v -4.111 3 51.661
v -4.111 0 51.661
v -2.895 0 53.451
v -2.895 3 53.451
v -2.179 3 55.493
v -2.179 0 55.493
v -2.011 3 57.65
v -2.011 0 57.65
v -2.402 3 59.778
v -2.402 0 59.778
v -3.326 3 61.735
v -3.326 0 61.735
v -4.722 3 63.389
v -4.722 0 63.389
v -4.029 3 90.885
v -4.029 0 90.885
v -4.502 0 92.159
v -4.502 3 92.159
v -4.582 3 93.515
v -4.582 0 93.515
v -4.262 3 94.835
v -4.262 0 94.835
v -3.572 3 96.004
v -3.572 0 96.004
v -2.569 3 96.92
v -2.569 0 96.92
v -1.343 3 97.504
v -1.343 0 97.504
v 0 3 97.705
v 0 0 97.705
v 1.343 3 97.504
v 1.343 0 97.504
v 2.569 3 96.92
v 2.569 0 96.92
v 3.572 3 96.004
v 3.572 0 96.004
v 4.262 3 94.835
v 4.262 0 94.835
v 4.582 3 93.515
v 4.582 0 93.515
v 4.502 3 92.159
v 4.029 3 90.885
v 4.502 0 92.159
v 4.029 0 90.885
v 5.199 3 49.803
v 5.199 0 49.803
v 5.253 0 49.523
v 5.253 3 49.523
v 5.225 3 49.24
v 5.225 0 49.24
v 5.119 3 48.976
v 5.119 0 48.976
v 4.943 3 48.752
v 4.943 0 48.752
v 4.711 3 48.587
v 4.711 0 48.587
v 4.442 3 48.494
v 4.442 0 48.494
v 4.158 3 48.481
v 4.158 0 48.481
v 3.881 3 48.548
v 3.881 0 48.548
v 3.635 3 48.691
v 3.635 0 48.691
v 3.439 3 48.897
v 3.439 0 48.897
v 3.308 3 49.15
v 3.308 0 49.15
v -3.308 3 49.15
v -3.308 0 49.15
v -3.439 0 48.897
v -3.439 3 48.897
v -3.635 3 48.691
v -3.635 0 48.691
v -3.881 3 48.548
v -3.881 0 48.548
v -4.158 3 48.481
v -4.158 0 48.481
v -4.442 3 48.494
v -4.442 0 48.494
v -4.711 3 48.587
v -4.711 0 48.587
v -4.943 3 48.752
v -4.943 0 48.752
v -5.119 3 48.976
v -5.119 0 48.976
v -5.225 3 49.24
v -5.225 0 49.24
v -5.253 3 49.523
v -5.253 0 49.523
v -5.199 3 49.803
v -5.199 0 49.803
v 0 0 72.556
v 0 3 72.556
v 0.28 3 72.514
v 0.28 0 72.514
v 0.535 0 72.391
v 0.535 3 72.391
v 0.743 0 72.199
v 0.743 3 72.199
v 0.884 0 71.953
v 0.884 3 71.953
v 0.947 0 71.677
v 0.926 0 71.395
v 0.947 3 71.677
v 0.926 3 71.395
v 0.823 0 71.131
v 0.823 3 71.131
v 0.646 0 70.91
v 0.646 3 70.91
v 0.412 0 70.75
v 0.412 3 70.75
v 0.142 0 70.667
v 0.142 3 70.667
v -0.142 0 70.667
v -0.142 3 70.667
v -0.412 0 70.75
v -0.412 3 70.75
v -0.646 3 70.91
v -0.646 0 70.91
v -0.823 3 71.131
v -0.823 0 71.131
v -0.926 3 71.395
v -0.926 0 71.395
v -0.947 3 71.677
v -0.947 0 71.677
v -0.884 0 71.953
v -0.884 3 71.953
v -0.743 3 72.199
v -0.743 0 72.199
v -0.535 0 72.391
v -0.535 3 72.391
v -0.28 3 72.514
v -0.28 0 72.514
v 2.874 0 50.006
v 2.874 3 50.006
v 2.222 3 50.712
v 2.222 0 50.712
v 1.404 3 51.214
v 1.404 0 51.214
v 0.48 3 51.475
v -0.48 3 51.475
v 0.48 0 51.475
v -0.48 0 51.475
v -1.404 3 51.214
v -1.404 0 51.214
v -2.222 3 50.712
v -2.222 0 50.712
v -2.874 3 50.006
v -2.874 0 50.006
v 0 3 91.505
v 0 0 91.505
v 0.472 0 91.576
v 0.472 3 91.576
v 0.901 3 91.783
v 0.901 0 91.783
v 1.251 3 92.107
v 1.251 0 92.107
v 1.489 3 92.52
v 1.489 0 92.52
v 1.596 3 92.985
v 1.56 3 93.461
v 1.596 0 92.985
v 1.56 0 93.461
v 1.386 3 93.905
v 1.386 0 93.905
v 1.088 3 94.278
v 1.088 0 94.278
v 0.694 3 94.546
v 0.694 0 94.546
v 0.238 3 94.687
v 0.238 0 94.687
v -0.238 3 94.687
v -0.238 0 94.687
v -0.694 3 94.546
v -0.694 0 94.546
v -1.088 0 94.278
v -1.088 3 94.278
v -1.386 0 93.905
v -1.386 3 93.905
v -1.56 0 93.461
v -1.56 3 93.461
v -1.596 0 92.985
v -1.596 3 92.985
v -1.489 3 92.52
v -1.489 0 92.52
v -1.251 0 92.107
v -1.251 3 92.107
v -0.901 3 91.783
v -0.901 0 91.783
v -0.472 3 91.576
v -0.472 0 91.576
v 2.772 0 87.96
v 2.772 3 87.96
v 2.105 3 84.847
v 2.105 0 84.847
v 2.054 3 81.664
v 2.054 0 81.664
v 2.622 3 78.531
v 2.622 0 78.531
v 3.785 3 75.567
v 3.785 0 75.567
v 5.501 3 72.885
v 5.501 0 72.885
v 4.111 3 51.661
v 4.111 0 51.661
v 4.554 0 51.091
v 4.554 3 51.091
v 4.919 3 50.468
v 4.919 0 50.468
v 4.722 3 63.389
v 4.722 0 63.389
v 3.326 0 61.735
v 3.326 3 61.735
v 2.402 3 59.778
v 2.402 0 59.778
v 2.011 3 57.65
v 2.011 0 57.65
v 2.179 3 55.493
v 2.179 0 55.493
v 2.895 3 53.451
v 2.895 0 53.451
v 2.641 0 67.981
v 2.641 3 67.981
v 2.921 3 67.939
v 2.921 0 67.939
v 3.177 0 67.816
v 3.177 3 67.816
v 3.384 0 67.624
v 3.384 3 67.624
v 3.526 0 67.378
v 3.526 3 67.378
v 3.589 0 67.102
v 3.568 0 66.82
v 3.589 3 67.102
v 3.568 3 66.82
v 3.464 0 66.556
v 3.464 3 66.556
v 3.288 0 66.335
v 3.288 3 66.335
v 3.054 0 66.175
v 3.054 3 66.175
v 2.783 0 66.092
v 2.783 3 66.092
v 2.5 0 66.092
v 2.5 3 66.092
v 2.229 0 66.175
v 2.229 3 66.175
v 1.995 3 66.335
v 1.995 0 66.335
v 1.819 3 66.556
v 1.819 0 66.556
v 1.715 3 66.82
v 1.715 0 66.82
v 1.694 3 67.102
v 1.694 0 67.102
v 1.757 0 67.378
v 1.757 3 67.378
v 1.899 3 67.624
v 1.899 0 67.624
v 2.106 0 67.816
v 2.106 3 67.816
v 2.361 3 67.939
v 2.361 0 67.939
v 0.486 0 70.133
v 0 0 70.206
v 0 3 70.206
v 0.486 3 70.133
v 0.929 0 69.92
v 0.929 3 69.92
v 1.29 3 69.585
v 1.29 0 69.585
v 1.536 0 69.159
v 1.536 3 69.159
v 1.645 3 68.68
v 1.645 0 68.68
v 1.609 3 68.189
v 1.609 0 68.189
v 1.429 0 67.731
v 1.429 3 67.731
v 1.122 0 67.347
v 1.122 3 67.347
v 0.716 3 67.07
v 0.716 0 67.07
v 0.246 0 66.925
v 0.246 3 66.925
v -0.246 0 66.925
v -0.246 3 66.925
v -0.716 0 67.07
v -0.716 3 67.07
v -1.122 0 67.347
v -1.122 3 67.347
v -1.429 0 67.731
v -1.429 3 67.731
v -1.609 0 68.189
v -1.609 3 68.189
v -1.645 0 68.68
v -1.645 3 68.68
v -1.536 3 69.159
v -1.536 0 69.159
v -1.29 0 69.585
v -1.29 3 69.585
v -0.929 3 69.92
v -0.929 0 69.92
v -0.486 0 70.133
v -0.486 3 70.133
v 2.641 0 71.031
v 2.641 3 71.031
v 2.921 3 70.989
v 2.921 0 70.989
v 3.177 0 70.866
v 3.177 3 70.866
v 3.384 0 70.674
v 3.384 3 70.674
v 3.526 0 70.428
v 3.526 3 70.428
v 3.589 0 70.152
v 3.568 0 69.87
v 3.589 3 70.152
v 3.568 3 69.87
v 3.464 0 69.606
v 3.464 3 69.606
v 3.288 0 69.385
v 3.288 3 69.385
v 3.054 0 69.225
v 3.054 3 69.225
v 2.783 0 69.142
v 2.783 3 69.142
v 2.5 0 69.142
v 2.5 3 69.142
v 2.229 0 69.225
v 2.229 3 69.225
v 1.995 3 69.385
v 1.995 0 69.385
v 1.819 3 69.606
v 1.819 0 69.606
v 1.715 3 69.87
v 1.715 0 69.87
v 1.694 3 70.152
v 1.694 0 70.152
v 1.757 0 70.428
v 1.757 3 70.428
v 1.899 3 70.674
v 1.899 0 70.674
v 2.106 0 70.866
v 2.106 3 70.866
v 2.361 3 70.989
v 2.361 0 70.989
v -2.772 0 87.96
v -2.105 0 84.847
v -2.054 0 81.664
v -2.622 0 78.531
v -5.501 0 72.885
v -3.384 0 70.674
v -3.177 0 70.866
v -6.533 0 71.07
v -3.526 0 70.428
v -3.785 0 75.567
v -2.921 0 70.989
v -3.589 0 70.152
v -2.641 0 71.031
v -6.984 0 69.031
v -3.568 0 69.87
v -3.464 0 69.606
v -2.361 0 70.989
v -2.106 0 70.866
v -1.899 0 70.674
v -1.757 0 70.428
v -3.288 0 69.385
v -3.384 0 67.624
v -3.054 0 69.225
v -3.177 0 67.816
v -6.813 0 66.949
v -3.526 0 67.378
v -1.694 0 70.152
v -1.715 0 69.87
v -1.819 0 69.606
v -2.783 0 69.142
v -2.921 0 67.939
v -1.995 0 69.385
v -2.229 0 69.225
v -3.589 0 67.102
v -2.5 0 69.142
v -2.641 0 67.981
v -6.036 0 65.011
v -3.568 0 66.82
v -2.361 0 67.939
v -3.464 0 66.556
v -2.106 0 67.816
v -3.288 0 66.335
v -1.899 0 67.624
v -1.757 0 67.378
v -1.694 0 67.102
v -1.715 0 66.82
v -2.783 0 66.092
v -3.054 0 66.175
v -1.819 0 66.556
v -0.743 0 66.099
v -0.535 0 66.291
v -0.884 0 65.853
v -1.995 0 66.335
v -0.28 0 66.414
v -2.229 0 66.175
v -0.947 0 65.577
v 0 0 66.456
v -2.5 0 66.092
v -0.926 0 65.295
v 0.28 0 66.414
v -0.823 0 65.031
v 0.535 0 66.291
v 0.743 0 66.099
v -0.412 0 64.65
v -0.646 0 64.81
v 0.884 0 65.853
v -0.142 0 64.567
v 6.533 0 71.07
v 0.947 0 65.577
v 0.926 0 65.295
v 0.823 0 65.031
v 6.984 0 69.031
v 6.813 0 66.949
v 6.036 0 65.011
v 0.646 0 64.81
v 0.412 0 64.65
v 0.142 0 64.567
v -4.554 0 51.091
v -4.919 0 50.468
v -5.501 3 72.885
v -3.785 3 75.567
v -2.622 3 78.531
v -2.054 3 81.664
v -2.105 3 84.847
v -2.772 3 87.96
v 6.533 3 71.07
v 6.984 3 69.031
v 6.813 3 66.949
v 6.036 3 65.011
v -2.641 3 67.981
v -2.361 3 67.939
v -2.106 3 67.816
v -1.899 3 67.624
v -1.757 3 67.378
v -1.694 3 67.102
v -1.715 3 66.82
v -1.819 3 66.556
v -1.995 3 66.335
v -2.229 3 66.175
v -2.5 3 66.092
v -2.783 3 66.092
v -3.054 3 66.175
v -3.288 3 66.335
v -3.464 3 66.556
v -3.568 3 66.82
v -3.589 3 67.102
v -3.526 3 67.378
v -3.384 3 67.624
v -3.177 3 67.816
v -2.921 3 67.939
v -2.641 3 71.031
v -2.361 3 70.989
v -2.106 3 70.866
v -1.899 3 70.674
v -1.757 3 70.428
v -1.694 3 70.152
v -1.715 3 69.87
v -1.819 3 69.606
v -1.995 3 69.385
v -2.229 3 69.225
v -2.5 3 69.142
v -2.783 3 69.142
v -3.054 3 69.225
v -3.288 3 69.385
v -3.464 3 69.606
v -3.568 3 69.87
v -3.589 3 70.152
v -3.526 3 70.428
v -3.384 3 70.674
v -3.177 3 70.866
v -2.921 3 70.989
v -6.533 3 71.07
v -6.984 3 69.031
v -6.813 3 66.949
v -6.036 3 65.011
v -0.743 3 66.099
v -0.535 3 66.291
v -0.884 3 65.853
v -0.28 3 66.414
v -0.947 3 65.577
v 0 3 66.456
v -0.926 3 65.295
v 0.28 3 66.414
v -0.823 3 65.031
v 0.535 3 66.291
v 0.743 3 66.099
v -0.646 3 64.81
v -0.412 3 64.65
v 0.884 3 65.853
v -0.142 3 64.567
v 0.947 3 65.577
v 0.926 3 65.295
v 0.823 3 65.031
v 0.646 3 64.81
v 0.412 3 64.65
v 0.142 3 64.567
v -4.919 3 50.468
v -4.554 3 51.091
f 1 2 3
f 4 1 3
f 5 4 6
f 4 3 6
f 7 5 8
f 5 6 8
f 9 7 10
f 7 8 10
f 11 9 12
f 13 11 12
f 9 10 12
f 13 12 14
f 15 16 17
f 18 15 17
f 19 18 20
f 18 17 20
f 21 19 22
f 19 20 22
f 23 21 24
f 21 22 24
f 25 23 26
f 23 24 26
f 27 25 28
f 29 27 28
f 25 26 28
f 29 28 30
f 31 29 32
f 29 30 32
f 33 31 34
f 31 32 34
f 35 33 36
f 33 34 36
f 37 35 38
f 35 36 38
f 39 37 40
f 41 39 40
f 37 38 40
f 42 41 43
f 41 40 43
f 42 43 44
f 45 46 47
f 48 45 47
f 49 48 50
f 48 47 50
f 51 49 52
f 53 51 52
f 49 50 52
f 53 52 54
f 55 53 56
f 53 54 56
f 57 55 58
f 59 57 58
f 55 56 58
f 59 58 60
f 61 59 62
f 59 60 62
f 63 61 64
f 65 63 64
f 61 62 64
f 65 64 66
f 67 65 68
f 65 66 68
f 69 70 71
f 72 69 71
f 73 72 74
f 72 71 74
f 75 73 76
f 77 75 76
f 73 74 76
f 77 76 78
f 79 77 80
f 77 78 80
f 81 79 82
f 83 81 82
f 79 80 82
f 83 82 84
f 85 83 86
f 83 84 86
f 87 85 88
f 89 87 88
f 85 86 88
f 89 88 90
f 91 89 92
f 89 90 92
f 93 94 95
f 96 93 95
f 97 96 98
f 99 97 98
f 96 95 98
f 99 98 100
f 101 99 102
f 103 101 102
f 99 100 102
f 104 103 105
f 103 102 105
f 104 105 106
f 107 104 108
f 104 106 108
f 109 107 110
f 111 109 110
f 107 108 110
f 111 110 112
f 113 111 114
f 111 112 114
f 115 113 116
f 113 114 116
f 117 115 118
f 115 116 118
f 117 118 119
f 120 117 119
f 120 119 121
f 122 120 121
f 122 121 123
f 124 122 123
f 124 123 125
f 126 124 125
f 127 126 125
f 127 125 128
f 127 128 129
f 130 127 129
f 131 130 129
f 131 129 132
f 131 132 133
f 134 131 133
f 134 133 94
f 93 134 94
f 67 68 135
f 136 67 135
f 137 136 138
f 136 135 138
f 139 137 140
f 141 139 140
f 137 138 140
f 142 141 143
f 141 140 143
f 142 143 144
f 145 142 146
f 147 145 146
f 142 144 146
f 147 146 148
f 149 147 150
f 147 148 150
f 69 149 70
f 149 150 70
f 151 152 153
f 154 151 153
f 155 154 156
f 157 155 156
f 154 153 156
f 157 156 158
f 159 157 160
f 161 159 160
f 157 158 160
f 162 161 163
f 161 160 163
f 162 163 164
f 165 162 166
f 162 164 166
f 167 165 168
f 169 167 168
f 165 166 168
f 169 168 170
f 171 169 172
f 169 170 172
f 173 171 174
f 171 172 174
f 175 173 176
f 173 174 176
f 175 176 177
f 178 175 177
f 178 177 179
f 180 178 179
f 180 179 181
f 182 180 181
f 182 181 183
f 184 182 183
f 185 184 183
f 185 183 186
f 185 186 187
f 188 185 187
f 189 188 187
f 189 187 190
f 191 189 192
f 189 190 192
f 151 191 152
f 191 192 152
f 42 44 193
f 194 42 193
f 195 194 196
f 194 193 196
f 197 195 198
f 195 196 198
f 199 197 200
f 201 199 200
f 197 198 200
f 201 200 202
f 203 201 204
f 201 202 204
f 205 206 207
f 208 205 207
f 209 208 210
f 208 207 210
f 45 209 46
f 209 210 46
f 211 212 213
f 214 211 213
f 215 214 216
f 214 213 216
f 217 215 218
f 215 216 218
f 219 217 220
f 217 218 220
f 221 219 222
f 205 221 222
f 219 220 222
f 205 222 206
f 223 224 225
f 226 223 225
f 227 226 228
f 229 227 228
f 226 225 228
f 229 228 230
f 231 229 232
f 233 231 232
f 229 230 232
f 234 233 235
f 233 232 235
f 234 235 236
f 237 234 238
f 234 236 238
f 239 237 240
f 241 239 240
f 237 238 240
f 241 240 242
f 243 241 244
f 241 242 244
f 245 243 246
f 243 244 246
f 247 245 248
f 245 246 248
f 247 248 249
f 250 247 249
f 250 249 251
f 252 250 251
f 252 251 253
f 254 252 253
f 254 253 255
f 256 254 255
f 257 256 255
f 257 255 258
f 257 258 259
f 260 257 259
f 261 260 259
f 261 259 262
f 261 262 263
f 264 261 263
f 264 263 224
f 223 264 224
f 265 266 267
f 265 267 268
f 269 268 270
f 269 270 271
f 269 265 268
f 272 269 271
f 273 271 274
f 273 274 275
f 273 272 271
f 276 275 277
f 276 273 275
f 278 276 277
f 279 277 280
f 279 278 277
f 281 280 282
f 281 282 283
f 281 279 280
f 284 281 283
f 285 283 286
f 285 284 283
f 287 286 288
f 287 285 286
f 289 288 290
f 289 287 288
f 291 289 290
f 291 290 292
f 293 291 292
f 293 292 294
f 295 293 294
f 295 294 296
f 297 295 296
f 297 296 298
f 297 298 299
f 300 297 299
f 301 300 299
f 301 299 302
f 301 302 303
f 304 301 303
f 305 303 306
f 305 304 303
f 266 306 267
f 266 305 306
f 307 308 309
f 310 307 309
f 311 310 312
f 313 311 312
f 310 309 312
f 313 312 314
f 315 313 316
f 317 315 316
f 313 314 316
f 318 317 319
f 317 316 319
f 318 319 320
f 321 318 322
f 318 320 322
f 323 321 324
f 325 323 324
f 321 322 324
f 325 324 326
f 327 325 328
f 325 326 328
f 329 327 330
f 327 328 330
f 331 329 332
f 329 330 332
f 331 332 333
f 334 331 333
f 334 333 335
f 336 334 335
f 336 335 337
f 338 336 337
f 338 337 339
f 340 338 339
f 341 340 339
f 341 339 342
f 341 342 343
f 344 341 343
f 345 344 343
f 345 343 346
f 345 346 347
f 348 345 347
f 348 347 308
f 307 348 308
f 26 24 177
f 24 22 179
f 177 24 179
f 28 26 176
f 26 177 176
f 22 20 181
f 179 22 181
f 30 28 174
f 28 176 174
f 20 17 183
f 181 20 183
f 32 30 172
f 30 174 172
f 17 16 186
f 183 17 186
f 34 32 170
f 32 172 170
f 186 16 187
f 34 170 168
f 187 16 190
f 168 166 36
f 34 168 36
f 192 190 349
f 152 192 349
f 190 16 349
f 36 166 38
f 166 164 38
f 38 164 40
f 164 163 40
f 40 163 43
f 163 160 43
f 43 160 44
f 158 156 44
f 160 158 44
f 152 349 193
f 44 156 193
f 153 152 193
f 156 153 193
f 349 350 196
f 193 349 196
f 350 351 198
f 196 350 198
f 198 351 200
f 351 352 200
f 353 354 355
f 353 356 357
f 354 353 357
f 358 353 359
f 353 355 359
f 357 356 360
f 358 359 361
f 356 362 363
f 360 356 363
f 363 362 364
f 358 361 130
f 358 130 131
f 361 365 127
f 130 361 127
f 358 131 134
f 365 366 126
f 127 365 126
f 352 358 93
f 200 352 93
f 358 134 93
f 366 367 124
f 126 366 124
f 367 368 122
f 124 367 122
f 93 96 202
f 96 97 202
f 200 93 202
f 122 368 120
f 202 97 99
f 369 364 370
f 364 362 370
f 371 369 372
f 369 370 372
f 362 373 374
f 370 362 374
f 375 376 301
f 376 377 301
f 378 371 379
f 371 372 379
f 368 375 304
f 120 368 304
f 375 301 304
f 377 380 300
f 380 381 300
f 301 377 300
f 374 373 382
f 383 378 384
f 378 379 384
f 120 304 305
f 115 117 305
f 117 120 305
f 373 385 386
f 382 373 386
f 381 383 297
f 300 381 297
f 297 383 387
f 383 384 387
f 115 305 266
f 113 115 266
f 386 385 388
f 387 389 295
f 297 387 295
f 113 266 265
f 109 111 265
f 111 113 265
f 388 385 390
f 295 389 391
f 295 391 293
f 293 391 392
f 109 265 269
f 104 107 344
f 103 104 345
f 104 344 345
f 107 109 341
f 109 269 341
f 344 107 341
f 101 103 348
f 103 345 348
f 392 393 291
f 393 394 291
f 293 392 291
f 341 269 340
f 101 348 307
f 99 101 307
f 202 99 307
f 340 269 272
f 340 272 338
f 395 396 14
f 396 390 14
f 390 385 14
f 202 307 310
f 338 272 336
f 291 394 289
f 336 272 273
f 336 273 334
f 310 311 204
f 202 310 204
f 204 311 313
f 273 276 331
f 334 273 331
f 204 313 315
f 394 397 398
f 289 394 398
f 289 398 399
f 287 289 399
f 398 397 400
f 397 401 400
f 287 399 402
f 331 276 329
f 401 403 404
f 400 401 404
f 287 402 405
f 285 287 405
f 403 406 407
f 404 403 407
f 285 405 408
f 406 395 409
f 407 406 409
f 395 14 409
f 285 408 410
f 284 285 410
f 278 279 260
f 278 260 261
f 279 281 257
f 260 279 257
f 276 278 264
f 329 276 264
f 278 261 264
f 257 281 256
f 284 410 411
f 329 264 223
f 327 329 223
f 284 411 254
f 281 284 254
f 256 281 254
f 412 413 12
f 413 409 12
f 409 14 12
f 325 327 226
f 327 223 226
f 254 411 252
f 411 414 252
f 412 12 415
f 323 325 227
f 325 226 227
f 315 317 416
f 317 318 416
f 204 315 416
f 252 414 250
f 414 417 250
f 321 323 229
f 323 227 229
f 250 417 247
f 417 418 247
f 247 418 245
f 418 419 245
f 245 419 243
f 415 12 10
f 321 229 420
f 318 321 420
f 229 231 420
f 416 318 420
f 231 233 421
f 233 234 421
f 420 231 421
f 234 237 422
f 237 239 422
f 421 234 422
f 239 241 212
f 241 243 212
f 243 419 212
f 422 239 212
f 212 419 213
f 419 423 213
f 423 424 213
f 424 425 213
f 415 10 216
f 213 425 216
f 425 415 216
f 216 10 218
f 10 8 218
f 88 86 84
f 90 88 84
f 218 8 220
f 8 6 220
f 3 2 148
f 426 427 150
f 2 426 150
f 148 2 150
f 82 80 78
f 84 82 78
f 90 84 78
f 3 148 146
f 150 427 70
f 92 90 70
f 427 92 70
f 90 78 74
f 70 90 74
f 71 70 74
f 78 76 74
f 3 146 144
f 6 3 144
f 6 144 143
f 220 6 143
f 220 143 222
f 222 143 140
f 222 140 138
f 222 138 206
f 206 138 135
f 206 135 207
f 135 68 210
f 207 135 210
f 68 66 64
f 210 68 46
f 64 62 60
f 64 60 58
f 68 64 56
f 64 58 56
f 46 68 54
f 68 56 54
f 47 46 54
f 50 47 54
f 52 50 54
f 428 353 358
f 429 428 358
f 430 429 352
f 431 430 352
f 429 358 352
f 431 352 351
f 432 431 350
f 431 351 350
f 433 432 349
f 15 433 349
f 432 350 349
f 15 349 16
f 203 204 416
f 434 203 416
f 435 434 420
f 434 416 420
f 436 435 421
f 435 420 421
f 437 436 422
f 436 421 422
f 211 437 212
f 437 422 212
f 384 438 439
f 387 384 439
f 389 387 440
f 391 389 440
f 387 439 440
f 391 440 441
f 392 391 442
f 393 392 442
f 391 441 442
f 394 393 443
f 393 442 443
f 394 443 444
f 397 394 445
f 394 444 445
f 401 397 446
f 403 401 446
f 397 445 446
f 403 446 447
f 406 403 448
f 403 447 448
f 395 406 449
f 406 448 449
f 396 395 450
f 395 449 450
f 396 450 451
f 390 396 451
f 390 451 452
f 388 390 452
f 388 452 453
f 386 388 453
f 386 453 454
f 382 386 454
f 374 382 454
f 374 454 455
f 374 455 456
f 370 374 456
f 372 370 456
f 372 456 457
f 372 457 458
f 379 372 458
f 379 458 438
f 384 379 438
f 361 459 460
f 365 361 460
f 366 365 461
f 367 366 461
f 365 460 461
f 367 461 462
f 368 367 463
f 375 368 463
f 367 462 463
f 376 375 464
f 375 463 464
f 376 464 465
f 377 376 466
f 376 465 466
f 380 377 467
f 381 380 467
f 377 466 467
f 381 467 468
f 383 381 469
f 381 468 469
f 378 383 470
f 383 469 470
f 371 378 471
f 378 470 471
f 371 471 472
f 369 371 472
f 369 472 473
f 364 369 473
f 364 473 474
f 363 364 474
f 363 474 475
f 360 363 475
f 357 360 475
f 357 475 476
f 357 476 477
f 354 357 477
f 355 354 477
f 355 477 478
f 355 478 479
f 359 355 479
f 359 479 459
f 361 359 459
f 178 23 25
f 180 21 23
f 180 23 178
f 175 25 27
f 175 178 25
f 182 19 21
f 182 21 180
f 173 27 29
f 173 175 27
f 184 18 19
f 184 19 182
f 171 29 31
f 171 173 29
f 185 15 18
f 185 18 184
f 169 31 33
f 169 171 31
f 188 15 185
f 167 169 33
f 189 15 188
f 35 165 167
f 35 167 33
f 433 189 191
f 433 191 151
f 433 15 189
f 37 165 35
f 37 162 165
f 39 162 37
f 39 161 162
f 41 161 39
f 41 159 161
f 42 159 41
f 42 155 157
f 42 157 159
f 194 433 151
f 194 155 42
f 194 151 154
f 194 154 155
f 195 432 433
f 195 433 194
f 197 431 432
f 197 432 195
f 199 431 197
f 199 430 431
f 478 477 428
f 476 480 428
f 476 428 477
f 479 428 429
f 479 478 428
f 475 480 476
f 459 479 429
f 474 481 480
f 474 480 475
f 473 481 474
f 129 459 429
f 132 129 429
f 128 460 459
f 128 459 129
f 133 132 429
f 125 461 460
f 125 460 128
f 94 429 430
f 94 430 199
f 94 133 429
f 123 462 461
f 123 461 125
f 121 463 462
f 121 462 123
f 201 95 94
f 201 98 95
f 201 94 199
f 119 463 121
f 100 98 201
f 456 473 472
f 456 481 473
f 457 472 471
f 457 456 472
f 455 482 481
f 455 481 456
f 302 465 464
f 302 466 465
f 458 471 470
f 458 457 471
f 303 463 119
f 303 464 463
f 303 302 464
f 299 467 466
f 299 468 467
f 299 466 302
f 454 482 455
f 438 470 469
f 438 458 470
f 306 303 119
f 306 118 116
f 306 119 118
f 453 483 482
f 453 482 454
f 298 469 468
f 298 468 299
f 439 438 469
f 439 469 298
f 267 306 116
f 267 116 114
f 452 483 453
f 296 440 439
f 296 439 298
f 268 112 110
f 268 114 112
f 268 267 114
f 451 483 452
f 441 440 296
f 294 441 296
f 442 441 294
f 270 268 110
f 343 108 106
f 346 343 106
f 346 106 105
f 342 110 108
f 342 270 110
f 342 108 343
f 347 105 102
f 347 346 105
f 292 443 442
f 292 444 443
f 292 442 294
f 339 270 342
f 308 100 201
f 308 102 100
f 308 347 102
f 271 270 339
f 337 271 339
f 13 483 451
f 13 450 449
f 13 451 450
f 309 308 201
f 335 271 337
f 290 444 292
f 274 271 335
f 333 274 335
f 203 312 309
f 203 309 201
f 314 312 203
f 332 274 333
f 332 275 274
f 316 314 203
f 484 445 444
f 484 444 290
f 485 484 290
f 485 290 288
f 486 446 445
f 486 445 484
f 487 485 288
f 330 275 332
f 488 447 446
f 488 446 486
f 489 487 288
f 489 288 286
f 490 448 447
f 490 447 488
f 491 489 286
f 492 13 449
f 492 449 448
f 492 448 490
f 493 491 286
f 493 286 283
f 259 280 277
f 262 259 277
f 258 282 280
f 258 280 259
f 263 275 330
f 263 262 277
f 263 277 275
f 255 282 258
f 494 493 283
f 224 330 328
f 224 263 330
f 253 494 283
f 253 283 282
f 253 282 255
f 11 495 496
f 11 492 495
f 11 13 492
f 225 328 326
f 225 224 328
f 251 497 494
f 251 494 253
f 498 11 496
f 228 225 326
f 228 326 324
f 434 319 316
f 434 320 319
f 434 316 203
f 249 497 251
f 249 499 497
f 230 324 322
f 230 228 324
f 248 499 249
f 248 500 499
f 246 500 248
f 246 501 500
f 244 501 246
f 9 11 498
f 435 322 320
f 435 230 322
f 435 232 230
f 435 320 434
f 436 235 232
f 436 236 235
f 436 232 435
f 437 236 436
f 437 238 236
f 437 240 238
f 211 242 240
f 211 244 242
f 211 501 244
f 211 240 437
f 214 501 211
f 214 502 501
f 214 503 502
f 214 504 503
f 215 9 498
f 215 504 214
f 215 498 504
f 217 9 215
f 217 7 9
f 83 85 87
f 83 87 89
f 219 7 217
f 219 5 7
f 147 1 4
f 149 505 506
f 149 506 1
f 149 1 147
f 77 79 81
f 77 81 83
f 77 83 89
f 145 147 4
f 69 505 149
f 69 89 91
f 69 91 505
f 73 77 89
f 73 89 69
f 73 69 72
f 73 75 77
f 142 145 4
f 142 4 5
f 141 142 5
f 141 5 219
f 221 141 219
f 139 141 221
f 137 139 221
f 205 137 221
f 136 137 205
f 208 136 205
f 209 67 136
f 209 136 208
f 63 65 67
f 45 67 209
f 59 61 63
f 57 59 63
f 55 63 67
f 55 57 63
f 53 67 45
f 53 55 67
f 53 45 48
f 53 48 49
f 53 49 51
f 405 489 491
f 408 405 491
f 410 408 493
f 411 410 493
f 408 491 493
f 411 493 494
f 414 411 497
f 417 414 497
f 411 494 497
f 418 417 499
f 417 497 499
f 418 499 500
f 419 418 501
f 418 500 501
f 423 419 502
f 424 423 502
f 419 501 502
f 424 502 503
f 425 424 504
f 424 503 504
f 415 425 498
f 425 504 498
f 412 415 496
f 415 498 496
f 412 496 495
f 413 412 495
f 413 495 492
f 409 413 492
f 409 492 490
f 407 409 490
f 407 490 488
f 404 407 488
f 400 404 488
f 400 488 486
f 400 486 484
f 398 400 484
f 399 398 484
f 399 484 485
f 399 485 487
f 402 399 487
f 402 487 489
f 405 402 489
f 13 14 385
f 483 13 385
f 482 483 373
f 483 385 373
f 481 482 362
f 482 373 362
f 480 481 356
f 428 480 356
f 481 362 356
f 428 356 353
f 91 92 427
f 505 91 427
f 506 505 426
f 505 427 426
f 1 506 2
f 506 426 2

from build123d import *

# Parameters (mm, degrees)
SKETCH1_R           = 1.65
BOSS_EXTRUDE1_DEPTH = 3
SKETCH2_R           = 1.6
BOSS_EXTRUDE2_DEPTH = 3
SKETCH3_R           = 0.95
CUT_EXTRUDE1_DEPTH  = 99.001298809


with BuildPart() as part:
    # Sketch1 → Boss-Extrude1 (new body)
    with BuildSketch(Plane(origin=(0, 0, 0), x_dir=(1, 0, 0), z_dir=(0, 1, 0))):
        with BuildLine():
            ThreePointArc((-4.721587007, -63.38854654), (0, -75.556390977), (4.721587007, -63.38854654))
            ThreePointArc((4.721587007, -63.38854654), (2.011300437, -57.650074902), (4.111268391, -51.661264952))
            ThreePointArc((4.111268391, -51.661264952), (4.746967497, -50.785668514), (5.198942096, -49.802560464))
            ThreePointArc((5.198942096, -49.802560464), (4.579991672, -48.53098649), (3.308417698, -49.149936914))
            ThreePointArc((3.308417698, -49.149936914), (0, -51.507845701), (-3.308417698, -49.149936914))
            ThreePointArc((-3.308417698, -49.149936914), (-4.579991672, -48.53098649), (-5.198942096, -49.802560464))
            ThreePointArc((-5.198942096, -49.802560464), (-4.746967497, -50.785668514), (-4.111268391, -51.661264952))
            ThreePointArc((-4.111268391, -51.661264952), (-2.011300437, -57.650074902), (-4.721587007, -63.38854654))
        make_face()
        with Locations(Location((0, -68.556390977, 0), (0, 0, 270))):
            Circle(SKETCH1_R, mode=Mode.SUBTRACT)
    extrude(amount=BOSS_EXTRUDE1_DEPTH)

    # Sketch2 → Boss-Extrude2 (add)
    with BuildSketch(Plane.XZ):
        with BuildLine():
            ThreePointArc((-4.029144211, 90.885477552), (0, 97.704936254), (4.029144211, 90.885477552))
            ThreePointArc((4.029144211, 90.885477552), (2.054398705, 81.663604808), (5.501134896, 72.885076096))
            ThreePointArc((5.501134896, 72.885076096), (0, 75.556390977), (-5.501134896, 72.885076096))
            ThreePointArc((-5.501134896, 72.885076096), (-2.054398705, 81.663604808), (-4.029144211, 90.885477552))
        make_face()
        with Locations(Location((0, 93.104936254, 0), (0, 0, 270))):
            Circle(SKETCH2_R, mode=Mode.SUBTRACT)
    extrude(amount=-BOSS_EXTRUDE2_DEPTH)

    # Sketch3 → Cut-Extrude1 (cut, through all)
    with BuildSketch(Plane(origin=(0, 3, 0), x_dir=(1, 0, 0), z_dir=(0, 1, 0))):
        with Locations(Location((0, -65.506390977, 0), (0, 0, 270))):
            Circle(SKETCH3_R)
        with Locations(Location((2.641377482, -67.031390977, 0), (0, 0, 270))):
            Circle(SKETCH3_R)
        with Locations(Location((2.641377482, -70.081390977, 0), (0, 0, 270))):
            Circle(SKETCH3_R)
        with Locations(Location((0, -71.606390977, 0), (0, 0, 270))):
            Circle(SKETCH3_R)
        with Locations(Location((-2.641377482, -70.081390977, 0), (0, 0, 270))):
            Circle(SKETCH3_R)
        with Locations(Location((-2.641377482, -67.031390977, 0), (0, 0, 270))):
            Circle(SKETCH3_R)
    extrude(amount=-CUT_EXTRUDE1_DEPTH, mode=Mode.SUBTRACT)


solid = part.part
